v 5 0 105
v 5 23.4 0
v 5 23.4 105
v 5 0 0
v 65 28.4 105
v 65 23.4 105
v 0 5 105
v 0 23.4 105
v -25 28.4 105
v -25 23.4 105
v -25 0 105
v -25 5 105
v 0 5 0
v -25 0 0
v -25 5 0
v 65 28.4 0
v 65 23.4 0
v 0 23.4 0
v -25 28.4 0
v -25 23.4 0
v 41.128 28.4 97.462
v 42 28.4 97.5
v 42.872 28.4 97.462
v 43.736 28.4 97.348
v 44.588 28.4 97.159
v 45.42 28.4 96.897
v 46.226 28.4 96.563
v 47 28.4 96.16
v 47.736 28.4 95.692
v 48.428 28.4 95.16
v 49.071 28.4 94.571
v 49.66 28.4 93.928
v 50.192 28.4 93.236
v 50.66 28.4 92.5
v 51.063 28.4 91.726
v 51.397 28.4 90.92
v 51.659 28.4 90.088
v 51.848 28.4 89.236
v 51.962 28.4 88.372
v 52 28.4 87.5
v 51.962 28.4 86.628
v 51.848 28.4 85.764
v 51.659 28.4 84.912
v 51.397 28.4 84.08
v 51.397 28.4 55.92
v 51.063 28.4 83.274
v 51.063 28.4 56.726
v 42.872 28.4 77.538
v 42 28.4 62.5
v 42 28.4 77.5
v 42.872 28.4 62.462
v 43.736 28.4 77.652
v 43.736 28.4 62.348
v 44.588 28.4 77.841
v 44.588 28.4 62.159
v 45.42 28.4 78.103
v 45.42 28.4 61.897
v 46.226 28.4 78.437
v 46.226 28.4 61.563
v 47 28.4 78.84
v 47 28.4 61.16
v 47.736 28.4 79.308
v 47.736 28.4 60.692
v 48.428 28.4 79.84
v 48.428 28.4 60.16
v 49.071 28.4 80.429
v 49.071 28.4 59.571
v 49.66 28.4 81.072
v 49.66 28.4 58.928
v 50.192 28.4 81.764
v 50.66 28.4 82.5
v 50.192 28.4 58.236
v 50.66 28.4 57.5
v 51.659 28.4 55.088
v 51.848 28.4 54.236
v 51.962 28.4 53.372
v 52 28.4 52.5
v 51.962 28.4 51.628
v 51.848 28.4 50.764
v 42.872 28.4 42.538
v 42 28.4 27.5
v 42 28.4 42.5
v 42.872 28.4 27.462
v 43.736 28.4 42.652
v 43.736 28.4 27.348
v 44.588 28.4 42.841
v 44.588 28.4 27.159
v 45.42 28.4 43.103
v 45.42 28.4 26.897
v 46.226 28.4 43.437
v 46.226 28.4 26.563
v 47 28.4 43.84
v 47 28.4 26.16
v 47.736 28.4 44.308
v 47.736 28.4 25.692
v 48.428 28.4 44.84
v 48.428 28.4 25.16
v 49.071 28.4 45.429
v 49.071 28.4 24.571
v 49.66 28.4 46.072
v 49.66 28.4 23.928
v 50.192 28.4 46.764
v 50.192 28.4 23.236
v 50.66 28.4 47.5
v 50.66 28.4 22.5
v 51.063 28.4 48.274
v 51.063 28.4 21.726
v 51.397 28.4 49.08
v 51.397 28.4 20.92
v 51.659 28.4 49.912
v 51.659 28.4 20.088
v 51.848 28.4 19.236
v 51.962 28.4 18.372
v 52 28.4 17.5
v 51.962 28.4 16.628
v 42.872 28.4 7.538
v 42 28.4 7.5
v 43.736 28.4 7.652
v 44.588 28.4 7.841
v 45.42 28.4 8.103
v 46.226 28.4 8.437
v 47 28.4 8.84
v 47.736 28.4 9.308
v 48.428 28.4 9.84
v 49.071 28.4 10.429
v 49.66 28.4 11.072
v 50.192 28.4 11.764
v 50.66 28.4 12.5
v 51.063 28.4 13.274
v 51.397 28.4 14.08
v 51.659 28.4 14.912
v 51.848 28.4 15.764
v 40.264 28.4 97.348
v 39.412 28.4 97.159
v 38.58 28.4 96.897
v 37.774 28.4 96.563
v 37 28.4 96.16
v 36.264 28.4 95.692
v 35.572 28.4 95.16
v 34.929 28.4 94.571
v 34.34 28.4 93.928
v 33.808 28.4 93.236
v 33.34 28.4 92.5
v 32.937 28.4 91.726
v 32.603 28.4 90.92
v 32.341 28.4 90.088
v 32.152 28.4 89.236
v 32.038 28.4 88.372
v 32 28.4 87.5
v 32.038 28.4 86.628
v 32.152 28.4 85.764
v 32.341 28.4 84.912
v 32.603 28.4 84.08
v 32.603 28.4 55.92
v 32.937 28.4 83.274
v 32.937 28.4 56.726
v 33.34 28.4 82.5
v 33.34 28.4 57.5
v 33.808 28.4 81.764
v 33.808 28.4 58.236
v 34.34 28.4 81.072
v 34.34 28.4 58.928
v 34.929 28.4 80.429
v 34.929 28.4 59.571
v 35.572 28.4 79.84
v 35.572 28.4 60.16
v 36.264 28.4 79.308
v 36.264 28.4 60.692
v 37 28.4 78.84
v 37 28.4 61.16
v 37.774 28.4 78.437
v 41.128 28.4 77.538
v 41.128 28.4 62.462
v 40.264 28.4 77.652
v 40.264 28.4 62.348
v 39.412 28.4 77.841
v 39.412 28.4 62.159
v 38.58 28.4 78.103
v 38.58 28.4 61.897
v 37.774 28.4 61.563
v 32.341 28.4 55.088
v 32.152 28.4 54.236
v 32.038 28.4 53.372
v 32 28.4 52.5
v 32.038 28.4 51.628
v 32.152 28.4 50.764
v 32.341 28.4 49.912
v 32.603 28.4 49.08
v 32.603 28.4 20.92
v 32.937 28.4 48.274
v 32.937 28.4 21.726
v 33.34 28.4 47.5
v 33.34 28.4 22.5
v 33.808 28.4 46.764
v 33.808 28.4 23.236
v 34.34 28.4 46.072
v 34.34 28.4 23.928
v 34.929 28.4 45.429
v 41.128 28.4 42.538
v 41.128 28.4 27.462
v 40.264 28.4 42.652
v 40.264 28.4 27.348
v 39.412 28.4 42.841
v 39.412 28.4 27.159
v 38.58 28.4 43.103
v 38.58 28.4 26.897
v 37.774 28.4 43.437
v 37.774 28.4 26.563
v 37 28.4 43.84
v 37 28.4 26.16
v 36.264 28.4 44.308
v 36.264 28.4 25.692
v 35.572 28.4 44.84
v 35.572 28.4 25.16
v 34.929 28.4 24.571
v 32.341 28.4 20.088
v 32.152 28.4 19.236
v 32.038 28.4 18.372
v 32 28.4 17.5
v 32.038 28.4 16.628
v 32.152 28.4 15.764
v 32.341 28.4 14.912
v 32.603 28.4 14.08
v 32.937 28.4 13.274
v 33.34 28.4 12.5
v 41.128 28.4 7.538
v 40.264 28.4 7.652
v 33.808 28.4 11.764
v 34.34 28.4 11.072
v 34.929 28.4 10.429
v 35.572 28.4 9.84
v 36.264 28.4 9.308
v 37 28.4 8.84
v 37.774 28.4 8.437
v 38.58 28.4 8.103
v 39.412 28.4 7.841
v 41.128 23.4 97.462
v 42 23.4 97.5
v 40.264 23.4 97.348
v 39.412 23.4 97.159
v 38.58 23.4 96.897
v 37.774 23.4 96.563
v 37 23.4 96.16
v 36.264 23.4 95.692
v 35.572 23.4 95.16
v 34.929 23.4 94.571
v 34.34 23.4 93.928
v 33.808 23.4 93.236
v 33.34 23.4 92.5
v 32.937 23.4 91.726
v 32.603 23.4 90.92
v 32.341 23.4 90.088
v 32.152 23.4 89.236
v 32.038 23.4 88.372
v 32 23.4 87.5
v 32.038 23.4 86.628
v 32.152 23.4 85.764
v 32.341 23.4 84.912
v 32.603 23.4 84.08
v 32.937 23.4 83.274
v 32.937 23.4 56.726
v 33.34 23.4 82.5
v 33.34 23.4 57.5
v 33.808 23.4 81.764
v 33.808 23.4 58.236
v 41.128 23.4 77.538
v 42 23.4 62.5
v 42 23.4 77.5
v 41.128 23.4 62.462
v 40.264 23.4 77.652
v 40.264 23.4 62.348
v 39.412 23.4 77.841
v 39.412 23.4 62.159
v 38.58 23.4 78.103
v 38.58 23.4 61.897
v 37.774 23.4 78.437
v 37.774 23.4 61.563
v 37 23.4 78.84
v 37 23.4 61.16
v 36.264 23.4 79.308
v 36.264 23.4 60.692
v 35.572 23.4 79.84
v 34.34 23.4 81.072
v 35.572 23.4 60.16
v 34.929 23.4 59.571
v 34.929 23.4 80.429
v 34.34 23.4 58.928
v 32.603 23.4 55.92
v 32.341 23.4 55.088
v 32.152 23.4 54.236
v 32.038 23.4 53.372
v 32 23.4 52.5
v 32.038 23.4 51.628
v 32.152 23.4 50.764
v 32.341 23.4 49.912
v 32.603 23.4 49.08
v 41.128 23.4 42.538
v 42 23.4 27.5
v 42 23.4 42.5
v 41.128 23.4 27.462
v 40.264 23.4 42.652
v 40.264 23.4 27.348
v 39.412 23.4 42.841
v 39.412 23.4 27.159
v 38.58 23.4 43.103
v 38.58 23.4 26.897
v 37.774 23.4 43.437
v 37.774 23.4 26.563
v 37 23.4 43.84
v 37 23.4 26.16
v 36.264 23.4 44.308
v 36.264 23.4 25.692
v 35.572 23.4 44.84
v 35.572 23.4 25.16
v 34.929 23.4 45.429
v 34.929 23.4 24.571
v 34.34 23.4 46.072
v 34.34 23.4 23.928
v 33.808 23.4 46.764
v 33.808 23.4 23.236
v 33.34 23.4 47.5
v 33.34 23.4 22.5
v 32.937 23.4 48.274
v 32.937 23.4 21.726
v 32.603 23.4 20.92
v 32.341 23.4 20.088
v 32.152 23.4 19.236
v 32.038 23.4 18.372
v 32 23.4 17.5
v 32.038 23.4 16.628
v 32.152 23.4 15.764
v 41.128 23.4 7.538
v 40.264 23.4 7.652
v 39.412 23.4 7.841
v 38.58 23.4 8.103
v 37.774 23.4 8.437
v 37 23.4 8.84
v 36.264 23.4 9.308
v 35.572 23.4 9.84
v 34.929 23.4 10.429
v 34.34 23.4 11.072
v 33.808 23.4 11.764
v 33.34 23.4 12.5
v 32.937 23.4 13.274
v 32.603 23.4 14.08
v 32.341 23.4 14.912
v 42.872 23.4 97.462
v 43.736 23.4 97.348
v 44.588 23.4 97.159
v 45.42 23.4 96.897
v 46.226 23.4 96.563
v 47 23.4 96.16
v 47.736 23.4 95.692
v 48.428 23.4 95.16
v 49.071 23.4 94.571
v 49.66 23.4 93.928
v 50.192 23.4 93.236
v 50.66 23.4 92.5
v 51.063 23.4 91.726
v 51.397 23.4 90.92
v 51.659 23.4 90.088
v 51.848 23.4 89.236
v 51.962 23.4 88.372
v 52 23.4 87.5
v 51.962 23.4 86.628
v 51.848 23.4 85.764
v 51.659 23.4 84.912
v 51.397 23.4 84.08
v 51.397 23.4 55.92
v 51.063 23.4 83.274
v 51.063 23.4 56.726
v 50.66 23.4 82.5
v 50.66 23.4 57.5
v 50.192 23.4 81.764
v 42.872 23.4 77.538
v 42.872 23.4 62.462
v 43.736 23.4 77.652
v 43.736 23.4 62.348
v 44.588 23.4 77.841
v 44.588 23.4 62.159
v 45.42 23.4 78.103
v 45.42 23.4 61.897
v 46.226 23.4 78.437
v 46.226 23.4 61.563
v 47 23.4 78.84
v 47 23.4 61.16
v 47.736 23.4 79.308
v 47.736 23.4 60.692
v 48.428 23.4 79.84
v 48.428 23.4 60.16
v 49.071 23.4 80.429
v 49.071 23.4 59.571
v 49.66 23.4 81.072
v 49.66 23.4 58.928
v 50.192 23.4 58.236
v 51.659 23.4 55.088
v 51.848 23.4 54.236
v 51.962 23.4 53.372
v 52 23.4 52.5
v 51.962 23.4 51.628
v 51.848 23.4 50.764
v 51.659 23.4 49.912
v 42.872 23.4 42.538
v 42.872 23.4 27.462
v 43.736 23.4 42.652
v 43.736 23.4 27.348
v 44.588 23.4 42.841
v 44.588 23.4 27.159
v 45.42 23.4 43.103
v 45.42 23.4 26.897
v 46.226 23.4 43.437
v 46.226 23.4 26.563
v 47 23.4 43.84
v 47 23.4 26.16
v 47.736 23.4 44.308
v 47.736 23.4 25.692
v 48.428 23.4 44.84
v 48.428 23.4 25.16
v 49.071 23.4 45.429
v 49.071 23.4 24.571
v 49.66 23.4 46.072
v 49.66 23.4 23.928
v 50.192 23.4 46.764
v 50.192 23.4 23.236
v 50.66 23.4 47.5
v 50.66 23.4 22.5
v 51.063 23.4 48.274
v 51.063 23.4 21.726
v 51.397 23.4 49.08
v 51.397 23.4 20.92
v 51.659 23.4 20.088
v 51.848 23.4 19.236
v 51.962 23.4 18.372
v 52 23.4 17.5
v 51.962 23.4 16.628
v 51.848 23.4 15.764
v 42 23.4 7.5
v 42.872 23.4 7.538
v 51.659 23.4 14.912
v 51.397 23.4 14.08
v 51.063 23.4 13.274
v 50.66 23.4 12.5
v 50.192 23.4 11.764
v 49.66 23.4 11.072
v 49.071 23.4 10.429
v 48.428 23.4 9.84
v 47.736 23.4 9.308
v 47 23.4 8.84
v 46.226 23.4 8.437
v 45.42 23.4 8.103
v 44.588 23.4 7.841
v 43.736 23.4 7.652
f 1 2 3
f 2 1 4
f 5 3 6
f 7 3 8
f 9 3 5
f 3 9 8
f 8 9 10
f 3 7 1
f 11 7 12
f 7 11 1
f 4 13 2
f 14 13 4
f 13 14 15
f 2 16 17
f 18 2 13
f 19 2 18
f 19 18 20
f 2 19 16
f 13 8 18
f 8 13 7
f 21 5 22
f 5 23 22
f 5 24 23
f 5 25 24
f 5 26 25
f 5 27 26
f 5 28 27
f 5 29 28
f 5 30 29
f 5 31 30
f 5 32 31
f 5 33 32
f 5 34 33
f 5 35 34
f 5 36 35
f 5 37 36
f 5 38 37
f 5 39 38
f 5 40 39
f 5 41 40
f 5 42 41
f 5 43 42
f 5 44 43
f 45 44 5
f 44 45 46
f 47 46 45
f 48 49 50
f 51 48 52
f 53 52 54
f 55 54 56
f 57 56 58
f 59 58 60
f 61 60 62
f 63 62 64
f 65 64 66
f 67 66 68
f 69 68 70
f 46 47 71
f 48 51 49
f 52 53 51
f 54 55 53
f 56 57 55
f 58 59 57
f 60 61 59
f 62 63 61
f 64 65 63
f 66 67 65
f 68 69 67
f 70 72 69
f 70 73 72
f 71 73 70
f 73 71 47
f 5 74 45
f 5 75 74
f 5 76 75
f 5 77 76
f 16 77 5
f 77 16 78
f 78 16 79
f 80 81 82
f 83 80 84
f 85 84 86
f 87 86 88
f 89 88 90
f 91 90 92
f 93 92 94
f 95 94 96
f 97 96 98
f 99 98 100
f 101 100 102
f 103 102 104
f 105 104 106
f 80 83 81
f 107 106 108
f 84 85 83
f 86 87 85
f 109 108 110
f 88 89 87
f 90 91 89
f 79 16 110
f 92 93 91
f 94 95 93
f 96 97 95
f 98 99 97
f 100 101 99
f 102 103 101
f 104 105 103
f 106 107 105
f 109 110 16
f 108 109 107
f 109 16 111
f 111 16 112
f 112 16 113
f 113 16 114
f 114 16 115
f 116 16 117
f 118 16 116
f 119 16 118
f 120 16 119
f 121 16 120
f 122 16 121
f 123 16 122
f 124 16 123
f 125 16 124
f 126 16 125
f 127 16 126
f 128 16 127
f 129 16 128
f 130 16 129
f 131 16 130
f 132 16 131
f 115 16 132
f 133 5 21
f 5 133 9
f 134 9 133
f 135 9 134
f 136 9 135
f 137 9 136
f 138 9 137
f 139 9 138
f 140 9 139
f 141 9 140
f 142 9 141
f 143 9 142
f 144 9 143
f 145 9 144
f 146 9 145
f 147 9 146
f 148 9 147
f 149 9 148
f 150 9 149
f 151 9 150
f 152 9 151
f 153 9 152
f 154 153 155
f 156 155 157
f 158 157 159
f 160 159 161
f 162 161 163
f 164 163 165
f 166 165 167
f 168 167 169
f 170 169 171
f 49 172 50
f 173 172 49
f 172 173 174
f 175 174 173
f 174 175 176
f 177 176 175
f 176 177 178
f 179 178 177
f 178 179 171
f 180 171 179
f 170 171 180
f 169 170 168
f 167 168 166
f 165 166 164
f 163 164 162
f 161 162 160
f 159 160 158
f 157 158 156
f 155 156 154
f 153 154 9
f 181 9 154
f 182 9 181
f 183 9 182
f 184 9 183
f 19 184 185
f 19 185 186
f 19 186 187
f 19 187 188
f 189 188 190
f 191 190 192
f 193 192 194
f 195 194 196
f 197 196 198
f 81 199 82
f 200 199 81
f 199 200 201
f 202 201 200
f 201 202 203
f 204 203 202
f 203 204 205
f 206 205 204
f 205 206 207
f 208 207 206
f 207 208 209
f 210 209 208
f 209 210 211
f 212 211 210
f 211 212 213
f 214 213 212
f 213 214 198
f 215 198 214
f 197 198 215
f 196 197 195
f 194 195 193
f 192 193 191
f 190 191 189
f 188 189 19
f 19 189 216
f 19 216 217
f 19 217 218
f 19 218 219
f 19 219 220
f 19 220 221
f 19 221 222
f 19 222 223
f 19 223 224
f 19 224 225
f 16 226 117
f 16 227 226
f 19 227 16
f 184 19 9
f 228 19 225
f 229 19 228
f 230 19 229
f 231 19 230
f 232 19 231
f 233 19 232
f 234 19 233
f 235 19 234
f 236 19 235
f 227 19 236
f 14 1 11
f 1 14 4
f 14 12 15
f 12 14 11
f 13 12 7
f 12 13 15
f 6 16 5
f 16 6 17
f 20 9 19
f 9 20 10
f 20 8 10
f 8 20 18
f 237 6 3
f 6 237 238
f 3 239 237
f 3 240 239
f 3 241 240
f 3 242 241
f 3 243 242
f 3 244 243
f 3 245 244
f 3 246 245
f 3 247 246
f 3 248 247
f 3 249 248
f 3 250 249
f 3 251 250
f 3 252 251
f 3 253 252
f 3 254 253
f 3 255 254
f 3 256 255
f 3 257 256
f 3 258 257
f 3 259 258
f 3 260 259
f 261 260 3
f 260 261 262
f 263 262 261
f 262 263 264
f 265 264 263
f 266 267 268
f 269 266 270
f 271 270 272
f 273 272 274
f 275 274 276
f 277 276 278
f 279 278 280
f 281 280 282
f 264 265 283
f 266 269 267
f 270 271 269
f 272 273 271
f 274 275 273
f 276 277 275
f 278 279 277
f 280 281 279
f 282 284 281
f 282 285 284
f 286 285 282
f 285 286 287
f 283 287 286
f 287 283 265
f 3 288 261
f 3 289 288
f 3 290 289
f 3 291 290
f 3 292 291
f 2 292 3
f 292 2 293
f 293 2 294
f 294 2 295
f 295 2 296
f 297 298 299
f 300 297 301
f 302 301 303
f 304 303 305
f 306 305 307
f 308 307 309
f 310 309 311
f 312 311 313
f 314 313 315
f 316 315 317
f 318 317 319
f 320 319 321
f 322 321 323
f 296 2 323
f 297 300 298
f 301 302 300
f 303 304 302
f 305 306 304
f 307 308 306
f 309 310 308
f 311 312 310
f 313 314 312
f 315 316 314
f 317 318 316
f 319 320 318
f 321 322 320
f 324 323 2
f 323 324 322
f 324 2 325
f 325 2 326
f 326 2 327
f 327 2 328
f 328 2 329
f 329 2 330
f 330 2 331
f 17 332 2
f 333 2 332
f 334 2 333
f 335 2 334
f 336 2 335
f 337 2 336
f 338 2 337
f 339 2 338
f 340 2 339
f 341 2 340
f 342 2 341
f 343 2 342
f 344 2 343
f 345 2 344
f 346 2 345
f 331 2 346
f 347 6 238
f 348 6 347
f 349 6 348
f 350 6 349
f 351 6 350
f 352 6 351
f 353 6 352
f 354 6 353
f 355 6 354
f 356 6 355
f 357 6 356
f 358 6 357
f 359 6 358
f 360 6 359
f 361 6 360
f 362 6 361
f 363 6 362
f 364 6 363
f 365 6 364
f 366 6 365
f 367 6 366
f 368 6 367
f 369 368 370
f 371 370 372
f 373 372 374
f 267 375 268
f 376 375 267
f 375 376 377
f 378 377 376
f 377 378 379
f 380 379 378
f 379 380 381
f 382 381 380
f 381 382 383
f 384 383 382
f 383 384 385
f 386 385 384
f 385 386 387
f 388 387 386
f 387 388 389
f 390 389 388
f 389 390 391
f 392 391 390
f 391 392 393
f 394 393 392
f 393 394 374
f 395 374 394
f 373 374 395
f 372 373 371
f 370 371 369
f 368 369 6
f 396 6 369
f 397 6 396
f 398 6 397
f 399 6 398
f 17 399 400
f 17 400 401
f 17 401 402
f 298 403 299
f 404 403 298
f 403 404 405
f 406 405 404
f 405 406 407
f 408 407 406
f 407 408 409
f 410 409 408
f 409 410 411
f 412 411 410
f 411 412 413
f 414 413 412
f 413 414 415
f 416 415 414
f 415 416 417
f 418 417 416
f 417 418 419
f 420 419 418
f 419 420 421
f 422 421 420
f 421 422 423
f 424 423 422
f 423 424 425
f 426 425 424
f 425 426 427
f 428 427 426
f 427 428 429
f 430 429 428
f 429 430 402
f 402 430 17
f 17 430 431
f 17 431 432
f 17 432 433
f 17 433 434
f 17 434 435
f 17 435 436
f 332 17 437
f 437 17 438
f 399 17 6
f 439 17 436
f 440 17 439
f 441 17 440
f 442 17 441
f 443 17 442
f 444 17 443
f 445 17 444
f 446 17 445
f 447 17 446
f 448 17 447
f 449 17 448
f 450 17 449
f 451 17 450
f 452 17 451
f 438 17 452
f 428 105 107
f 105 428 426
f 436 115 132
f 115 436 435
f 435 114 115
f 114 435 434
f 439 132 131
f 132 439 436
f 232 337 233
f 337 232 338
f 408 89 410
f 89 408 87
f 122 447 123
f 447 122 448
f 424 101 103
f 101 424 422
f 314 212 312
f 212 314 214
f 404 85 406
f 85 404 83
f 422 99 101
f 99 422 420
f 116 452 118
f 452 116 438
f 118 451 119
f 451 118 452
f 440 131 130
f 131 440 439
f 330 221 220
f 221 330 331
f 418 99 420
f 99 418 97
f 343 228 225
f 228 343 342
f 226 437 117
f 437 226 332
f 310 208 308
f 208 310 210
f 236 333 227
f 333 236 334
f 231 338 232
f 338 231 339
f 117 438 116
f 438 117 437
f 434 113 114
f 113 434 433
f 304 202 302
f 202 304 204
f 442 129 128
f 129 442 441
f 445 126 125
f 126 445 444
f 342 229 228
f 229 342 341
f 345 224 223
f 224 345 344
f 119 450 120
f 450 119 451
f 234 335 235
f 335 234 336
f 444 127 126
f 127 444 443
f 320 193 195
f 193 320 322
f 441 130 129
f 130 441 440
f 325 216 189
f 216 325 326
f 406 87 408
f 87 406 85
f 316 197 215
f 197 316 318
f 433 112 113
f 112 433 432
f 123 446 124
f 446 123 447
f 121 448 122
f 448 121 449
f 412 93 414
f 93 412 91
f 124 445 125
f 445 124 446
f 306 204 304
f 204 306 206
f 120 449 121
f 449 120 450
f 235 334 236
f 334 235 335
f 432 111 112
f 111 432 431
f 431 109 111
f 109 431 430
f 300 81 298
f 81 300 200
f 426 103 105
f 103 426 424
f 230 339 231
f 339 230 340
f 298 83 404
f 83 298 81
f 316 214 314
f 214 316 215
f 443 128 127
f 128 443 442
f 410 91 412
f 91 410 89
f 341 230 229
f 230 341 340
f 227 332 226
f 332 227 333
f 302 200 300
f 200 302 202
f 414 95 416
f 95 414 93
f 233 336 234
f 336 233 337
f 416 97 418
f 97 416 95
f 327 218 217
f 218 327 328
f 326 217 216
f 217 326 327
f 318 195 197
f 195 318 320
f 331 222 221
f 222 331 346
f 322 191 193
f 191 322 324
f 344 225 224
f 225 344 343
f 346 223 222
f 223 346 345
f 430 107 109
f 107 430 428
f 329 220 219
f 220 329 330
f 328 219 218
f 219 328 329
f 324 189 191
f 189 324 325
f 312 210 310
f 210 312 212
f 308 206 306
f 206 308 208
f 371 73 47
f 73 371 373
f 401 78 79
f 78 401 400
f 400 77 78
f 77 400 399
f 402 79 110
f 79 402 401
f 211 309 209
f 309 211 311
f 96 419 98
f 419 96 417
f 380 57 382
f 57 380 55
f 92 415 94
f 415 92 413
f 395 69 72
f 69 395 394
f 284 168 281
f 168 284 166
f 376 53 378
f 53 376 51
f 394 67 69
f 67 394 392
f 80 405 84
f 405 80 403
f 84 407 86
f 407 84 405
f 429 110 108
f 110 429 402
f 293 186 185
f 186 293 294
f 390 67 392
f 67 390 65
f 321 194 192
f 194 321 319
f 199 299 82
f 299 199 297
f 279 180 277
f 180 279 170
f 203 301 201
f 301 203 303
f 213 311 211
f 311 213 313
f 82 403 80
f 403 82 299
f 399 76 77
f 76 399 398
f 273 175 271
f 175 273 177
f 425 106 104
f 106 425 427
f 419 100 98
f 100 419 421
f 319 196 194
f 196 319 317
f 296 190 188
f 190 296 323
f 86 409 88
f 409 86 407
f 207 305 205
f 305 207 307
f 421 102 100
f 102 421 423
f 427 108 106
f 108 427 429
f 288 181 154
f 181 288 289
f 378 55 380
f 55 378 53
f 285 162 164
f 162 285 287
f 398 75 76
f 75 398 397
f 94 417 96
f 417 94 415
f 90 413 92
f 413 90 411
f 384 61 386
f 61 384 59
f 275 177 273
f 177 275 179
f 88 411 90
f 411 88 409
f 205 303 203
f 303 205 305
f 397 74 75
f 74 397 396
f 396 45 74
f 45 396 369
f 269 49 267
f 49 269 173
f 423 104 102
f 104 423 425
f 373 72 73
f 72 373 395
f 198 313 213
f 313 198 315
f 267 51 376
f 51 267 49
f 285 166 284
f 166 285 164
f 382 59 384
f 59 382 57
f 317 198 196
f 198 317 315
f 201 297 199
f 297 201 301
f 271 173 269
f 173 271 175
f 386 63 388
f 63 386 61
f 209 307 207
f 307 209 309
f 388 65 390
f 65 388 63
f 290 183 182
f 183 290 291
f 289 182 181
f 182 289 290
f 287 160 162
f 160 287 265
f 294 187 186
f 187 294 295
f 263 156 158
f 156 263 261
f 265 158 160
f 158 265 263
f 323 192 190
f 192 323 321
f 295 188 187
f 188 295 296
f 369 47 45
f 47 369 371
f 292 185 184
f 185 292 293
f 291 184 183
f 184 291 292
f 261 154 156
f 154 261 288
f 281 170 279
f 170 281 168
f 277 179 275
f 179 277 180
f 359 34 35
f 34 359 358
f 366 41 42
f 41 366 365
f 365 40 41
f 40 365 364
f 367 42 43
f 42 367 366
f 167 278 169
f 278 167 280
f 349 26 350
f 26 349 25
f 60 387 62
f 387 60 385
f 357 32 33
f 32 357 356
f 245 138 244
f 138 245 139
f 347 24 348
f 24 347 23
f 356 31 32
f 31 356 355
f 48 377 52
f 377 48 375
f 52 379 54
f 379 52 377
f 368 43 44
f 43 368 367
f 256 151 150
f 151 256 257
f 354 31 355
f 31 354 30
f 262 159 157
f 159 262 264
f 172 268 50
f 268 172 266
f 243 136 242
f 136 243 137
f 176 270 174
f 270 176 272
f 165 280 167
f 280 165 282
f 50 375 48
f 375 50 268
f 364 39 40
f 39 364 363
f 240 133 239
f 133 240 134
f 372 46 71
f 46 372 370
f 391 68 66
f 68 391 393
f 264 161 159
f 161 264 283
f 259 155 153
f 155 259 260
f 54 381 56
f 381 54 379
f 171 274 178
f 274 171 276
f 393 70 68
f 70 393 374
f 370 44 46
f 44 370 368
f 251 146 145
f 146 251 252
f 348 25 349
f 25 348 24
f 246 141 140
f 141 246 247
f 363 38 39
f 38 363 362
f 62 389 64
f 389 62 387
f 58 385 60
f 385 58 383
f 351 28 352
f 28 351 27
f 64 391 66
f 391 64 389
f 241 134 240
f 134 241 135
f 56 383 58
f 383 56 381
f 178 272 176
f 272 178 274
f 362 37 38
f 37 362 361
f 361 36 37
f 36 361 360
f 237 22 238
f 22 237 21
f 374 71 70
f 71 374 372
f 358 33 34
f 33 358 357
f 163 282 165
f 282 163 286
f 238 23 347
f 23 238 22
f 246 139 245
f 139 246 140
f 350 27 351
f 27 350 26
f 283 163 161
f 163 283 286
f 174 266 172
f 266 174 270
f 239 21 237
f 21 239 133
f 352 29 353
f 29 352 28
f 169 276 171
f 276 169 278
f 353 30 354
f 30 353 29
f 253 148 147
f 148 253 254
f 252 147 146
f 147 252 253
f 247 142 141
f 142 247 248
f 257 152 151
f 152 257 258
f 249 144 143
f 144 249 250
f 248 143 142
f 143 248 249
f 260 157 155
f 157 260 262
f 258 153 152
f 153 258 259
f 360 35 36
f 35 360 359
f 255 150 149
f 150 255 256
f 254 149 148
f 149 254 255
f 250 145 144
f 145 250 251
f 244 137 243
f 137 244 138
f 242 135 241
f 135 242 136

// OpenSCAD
// KNOWN-RIGHT ALTERNATIVE (must pass): a correct part coded independently, from cubes instead of a 2-D profile
// built from cubes in print orientation
difference(){ union(){ cube([5,28.4,105]); translate([-25,0,0]) cube([30,5,105]); translate([-25,23.4,0]) cube([90,5,105]); }
 for(z=[17.5:35:87.5]) translate([42,20,z]) rotate([-90,0,0]) cylinder(d=20,h=12,$fn=72); }
